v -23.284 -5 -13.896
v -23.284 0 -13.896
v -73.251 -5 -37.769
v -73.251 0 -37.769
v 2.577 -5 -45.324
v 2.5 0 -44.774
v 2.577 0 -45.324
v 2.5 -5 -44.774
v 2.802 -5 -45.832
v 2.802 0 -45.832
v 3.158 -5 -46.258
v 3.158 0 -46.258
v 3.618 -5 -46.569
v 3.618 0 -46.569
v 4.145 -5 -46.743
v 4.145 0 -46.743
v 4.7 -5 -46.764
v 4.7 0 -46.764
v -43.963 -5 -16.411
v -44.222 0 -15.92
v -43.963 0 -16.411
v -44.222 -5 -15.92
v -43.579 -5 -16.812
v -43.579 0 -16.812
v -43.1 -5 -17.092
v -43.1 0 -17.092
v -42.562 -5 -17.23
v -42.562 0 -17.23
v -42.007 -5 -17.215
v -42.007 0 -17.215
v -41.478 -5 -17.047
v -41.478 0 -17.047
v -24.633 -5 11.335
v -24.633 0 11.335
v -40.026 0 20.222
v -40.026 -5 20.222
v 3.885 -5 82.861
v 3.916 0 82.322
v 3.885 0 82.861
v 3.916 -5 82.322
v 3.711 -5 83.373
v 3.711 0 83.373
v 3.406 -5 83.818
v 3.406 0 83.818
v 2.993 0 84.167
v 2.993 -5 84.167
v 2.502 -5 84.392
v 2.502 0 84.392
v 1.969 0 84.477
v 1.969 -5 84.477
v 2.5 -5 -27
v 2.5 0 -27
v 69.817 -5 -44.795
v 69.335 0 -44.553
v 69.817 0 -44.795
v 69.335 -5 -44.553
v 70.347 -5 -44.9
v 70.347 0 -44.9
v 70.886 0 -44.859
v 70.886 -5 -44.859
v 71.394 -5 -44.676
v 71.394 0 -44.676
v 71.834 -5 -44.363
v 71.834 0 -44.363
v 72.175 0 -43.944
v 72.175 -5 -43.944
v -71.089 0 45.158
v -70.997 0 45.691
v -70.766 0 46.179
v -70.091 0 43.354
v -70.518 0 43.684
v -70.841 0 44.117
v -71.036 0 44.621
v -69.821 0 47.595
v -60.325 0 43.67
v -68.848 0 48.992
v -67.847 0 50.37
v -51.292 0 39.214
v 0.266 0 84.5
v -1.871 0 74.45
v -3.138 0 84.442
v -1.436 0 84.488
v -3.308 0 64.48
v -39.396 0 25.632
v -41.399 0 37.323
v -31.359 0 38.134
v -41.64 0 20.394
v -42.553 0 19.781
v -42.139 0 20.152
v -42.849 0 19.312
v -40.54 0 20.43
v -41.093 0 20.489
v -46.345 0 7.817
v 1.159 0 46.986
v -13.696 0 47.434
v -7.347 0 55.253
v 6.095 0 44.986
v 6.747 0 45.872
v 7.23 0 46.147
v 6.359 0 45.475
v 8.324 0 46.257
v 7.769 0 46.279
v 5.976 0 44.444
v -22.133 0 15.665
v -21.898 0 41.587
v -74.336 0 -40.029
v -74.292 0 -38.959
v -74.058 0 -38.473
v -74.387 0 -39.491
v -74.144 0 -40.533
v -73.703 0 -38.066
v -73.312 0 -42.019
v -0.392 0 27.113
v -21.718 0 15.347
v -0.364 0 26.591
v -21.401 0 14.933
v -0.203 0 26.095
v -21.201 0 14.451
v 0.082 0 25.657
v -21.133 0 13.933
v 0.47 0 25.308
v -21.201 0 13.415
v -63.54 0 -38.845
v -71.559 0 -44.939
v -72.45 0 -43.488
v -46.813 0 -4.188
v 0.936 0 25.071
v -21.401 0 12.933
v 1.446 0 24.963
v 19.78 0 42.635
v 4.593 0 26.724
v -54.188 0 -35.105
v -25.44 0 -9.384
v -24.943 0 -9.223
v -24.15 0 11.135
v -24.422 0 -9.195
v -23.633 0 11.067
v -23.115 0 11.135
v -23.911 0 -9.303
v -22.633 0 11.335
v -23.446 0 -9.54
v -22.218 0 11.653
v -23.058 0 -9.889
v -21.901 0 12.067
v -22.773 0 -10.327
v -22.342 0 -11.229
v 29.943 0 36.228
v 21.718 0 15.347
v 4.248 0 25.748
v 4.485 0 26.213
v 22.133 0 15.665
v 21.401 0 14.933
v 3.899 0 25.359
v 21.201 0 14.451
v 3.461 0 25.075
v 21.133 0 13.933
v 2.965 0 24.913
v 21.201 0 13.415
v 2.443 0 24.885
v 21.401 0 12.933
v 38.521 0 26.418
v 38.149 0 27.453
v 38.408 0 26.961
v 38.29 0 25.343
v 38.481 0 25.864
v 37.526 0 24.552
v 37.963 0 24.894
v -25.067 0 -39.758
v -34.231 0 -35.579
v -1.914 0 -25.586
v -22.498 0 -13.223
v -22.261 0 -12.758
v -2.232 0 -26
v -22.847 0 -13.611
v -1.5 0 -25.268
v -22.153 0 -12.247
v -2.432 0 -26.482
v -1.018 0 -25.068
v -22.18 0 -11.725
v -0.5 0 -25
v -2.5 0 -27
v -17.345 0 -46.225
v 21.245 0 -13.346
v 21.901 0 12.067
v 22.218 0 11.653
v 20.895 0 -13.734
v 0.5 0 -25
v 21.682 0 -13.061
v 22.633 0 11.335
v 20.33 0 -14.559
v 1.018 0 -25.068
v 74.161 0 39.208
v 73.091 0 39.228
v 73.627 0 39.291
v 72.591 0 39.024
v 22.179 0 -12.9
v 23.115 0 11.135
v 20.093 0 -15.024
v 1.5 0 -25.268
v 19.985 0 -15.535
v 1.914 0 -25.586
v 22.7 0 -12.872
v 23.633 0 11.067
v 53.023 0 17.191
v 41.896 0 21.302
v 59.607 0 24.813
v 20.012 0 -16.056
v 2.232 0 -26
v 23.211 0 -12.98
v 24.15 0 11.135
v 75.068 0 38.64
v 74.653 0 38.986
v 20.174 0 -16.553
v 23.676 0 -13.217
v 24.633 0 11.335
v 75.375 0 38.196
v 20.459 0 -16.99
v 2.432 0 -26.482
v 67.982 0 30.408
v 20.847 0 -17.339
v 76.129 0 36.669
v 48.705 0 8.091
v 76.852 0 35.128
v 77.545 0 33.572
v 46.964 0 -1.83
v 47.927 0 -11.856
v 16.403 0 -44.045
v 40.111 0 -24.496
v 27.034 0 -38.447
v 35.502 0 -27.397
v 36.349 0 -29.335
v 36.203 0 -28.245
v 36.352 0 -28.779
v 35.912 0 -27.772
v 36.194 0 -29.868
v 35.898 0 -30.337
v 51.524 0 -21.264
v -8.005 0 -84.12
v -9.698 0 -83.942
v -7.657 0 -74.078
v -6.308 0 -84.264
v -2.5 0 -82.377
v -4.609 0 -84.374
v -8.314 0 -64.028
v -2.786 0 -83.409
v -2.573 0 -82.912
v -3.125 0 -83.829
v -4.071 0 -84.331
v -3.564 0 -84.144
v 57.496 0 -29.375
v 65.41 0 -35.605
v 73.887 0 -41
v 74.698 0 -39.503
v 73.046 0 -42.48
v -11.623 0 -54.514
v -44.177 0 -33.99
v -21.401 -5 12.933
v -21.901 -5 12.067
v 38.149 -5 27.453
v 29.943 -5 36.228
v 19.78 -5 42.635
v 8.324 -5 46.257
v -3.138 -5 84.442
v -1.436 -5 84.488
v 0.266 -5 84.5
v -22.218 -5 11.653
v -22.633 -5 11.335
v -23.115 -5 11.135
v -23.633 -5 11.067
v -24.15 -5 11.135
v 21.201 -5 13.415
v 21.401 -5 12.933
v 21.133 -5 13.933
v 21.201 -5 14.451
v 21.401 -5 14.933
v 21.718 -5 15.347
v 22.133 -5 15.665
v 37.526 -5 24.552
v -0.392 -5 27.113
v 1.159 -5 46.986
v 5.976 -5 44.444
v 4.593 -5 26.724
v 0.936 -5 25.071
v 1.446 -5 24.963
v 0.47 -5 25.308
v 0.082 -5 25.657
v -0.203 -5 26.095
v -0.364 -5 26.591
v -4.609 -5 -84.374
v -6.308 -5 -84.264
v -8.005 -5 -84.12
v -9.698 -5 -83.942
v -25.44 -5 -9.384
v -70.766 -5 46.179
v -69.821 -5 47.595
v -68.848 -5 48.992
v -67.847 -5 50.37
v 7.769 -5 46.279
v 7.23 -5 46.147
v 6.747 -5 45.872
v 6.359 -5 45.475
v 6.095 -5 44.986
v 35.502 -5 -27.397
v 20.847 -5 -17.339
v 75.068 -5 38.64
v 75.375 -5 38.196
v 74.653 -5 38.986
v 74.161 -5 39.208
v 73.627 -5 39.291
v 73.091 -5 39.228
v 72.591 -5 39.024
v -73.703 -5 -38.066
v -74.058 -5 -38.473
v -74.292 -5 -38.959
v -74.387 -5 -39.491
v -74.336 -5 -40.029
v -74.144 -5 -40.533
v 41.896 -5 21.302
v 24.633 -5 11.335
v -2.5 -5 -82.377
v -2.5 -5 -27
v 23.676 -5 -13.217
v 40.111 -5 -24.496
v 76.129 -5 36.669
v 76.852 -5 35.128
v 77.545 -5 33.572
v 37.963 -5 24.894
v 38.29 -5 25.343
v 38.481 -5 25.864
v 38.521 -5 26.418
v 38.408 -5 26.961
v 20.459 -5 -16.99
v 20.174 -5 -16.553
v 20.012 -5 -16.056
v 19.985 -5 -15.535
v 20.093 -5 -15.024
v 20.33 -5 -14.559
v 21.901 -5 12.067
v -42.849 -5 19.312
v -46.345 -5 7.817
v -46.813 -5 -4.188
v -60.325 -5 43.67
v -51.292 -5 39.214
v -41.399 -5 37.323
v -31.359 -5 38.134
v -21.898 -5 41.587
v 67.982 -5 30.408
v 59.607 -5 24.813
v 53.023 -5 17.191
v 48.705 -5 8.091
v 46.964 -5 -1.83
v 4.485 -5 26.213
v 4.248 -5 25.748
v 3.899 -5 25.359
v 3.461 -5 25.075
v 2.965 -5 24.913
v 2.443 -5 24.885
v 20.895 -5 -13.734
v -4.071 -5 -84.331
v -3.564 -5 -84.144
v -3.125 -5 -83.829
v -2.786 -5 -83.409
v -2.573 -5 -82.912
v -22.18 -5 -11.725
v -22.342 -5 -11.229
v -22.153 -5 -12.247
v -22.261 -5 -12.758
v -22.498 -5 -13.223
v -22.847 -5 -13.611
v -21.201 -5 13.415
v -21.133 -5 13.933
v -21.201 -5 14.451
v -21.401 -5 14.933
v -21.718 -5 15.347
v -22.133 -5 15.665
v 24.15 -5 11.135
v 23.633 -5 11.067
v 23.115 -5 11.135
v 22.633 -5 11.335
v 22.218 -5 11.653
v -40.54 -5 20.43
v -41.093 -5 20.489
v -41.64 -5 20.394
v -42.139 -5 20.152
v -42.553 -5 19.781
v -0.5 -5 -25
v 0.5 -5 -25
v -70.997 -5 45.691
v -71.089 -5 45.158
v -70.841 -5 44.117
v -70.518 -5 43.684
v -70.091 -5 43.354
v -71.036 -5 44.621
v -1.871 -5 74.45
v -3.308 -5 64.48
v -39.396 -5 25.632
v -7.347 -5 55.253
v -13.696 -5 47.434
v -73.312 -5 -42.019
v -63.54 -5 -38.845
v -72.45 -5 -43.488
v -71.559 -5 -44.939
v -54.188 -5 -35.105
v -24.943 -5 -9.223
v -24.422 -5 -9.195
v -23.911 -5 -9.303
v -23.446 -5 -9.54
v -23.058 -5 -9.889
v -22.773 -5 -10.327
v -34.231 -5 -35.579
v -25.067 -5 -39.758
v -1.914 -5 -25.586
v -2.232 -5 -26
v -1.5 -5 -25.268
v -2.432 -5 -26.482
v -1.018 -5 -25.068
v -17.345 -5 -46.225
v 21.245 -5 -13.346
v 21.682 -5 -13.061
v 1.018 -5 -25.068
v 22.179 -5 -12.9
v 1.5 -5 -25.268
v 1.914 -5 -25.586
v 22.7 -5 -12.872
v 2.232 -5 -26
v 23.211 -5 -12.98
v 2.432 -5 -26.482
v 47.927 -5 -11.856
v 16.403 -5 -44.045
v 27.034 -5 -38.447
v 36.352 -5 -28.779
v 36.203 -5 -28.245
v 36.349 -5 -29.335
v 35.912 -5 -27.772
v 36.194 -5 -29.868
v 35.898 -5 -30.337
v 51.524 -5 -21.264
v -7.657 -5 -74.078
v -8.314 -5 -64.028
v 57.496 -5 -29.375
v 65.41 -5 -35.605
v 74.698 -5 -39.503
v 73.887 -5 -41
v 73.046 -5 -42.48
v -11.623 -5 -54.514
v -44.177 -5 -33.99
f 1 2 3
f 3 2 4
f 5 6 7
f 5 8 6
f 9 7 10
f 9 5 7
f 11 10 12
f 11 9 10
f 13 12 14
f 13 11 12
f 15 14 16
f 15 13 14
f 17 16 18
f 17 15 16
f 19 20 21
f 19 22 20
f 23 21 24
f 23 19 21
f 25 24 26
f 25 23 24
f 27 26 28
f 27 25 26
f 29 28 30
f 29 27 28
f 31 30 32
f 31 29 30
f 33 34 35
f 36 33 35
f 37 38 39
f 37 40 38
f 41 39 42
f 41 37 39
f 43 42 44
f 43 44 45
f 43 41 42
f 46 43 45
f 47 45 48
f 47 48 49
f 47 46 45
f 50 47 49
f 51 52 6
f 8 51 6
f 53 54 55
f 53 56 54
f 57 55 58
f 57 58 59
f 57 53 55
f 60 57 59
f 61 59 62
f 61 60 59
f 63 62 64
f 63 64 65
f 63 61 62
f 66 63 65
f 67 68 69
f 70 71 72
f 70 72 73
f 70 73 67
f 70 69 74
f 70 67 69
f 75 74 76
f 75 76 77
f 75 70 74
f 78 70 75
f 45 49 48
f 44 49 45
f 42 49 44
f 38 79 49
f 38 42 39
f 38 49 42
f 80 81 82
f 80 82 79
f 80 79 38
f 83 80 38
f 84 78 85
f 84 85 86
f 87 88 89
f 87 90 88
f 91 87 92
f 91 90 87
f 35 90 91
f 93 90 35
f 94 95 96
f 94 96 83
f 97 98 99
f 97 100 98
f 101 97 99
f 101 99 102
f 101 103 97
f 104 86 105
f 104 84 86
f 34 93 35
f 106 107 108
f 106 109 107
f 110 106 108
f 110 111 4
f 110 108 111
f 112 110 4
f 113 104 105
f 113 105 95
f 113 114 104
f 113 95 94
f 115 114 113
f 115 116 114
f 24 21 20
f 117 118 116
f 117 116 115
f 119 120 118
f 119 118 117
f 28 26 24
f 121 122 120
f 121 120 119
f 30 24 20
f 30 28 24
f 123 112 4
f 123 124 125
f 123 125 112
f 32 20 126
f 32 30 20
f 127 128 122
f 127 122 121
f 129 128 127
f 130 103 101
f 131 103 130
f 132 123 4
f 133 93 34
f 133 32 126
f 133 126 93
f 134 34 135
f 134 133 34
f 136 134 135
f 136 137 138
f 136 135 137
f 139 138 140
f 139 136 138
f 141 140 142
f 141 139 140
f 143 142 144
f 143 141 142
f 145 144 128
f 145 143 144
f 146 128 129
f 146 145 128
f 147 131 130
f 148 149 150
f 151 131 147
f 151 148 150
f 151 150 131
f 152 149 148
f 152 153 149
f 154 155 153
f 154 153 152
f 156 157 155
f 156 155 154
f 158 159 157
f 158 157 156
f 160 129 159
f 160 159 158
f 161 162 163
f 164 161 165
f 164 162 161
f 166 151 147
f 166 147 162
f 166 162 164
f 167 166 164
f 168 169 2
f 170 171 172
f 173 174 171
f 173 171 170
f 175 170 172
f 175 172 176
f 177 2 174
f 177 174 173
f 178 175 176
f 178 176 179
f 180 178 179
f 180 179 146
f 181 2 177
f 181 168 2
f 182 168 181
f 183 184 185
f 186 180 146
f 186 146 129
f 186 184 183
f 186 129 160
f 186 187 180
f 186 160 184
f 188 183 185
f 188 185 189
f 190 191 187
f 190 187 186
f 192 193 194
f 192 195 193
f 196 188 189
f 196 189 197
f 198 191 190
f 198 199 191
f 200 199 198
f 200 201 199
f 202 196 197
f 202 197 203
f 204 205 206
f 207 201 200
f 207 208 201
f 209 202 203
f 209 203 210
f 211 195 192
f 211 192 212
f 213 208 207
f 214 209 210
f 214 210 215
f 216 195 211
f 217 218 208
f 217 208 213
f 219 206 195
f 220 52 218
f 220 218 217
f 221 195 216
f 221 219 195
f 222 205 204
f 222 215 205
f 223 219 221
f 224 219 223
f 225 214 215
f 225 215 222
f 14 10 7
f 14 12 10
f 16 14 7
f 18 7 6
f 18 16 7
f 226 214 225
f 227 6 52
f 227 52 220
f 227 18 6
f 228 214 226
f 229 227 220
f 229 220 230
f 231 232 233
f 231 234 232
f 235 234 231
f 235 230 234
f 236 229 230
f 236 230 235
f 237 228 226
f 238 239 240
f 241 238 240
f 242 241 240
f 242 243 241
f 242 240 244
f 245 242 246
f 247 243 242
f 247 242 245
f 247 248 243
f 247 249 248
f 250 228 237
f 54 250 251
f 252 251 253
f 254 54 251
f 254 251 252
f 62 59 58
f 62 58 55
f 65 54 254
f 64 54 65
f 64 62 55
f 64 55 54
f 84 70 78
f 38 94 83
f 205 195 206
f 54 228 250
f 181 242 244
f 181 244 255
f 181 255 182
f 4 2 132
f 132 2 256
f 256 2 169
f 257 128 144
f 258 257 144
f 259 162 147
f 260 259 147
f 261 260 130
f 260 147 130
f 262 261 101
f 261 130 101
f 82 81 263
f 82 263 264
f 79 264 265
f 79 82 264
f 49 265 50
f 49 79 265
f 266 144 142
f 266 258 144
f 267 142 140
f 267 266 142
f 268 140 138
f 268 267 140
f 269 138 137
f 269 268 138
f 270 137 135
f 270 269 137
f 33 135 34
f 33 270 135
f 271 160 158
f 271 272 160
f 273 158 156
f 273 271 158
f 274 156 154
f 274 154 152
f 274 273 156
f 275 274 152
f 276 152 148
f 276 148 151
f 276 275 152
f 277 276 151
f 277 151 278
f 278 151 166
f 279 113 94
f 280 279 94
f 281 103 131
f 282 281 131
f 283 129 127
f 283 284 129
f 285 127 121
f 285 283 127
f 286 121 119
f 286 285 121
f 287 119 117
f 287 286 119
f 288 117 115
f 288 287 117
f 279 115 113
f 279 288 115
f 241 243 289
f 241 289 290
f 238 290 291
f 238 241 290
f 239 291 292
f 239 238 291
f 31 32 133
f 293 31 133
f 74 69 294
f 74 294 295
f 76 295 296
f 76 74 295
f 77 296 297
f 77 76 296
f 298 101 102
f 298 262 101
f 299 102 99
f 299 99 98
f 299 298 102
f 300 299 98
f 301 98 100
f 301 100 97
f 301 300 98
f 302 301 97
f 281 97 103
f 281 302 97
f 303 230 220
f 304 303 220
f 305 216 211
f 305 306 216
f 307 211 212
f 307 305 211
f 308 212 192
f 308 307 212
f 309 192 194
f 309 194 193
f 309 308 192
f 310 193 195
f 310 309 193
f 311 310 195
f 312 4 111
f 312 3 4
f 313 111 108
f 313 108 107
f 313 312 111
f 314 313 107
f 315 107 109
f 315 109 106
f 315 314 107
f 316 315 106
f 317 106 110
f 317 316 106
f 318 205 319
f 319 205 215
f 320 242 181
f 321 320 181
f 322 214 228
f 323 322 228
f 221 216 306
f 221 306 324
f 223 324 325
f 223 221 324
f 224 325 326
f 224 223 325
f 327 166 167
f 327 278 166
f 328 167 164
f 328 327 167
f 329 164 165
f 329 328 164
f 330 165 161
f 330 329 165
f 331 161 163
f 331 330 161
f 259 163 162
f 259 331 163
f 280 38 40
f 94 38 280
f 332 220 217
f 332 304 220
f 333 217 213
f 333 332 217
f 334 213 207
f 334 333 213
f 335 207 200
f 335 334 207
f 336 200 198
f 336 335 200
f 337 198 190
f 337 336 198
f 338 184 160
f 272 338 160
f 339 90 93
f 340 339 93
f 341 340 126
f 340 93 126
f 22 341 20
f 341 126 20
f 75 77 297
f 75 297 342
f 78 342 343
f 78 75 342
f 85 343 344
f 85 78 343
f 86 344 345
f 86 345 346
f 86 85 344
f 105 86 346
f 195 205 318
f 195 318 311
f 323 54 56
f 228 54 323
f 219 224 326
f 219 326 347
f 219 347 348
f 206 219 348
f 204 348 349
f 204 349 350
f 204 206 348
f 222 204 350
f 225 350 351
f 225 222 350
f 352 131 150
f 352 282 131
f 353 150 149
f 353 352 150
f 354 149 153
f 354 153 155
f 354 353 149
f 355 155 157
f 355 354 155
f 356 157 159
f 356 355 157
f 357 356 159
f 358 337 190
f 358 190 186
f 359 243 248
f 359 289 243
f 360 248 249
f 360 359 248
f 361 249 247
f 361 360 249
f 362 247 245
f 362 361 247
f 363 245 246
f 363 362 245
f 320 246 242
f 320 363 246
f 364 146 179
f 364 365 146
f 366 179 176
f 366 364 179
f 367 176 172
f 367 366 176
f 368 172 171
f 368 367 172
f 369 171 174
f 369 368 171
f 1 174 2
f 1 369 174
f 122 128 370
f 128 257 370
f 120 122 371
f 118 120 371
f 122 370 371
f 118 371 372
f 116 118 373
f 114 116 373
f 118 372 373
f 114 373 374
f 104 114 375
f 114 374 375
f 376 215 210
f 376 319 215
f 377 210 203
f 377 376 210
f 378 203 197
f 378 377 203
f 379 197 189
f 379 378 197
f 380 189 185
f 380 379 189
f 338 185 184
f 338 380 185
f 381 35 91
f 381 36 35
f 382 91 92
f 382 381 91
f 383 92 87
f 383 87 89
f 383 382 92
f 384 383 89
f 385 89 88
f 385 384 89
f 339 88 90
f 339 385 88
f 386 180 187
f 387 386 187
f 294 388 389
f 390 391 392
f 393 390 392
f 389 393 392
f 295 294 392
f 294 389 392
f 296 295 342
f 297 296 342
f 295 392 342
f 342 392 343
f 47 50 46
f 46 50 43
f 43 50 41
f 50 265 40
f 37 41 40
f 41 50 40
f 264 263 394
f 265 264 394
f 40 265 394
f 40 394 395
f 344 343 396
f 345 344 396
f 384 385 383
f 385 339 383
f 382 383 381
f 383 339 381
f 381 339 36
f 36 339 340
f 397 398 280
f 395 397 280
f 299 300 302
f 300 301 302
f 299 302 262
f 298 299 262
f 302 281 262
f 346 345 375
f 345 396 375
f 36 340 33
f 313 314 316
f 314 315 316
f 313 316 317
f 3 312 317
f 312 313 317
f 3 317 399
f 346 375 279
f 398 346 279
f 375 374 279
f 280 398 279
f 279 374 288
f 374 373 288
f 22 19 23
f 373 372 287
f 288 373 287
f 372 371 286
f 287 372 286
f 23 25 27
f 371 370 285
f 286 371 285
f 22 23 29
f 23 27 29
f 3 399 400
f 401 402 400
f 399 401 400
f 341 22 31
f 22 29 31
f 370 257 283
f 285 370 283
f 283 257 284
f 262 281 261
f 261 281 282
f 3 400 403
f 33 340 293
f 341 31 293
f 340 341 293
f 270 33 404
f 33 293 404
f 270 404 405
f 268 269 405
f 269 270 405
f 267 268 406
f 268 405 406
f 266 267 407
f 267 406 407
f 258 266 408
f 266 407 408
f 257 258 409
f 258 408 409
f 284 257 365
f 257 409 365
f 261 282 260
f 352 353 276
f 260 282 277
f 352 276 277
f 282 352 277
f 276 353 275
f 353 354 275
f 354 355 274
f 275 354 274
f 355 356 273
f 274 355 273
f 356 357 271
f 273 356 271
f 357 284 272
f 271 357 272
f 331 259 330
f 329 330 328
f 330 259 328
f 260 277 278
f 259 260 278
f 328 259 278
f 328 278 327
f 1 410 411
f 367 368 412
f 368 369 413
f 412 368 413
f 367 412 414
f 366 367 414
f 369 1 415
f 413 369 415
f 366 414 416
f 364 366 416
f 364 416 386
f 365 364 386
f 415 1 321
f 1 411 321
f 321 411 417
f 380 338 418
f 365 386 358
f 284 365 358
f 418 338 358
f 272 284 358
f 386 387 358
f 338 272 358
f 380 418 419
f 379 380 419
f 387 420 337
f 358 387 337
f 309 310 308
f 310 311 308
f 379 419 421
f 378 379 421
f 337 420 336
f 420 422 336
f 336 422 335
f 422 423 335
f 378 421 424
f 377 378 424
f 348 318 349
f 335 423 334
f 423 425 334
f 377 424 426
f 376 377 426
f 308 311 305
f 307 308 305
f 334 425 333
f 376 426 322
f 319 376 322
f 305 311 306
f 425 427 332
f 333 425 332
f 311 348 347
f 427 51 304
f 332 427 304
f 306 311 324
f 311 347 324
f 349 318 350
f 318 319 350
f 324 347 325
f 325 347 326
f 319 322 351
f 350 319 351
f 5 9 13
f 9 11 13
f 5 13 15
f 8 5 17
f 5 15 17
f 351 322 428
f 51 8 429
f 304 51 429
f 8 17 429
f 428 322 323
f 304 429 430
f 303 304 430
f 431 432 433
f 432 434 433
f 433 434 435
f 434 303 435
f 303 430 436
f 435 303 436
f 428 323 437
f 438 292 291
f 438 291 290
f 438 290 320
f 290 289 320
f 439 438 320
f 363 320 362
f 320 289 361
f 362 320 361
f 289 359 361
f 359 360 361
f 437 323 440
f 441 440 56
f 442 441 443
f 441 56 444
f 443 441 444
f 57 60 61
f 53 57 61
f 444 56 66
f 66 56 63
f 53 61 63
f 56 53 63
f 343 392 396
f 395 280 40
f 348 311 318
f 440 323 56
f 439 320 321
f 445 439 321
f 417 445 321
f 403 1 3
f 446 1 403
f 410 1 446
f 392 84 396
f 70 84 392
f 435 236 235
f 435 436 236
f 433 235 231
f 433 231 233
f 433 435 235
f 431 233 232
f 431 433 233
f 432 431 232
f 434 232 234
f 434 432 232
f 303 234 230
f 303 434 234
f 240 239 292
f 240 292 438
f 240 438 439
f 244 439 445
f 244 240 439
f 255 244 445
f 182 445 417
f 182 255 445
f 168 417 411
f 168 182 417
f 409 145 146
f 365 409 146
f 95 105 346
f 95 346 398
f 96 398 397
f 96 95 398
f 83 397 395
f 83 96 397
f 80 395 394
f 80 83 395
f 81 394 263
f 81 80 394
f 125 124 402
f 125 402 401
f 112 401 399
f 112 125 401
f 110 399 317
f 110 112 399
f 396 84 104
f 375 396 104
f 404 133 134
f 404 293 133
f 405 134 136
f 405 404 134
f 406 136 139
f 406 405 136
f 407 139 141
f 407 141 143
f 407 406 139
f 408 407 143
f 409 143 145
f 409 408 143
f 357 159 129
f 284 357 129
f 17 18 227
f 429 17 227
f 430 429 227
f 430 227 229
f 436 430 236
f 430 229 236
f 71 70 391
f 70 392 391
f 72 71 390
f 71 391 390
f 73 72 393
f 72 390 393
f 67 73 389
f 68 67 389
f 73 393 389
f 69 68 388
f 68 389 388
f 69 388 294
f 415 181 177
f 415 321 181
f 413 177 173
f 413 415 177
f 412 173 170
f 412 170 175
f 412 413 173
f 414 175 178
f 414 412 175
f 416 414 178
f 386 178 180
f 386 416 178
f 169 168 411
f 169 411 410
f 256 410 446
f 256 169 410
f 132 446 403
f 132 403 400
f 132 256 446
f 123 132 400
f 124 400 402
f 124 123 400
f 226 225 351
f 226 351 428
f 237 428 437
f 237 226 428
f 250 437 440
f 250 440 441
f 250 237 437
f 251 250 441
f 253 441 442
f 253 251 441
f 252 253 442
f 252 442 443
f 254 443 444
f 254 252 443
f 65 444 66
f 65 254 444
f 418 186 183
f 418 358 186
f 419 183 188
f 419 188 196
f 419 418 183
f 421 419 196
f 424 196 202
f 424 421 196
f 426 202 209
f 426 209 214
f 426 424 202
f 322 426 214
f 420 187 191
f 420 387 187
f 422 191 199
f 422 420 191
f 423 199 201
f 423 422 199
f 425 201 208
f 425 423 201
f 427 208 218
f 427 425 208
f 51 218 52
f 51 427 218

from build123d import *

# Parameters (mm, degrees)
EXTRUDE_1_DEPTH = 5
EXTRUDE_2_DEPTH = 5
FILLET_1_R      = 2


with BuildPart() as part:
    # 草圖1 → 填料-伸長1 (new body)
    with BuildSketch(Plane(origin=(0, 0, 0), x_dir=(1, 0, 0), z_dir=(0, 1, 0))):
        with BuildLine():
            Line((41.895571715, -21.301668261), (22.900635095, -10.334936491))
            Line((22.900635095, -10.334936491), (20.400635095, -14.665063509))
            Line((20.400635095, -14.665063509), (39.395571715, -25.63179528))
            ThreePointArc((39.395571715, -25.63179528), (25.066666667, -39.75754296), (6.143670641, -46.596730691))
            Line((6.143670641, -46.596730691), (4.437329437, -24.729741355))
            Line((4.437329437, -24.729741355), (-0.547516958, -25.118722602))
            Line((-0.547516958, -25.118722602), (1.158824246, -46.985711938))
            ThreePointArc((1.158824246, -46.985711938), (-21.897708862, -41.587141602), (-39.395571715, -25.63179528))
            Line((-39.395571715, -25.63179528), (-20.400635095, -14.665063509))
            Line((-20.400635095, -14.665063509), (-22.900635095, -10.334936491))
            Line((-22.900635095, -10.334936491), (-41.895571715, -21.301668261))
            ThreePointArc((-41.895571715, -21.301668261), (-46.964375529, -1.829598641), (-43.425787832, 17.977790497))
            Line((-43.425787832, 17.977790497), (-23.635248961, 8.522030659))
            Line((-23.635248961, 8.522030659), (-21.479693405, 13.033524896))
            Line((-21.479693405, 13.033524896), (-41.270232276, 22.489284734))
            ThreePointArc((-41.270232276, 22.489284734), (-25.066666667, 39.75754296), (-2.5, 46.933463541))
            Line((-2.5, 46.933463541), (-2.5, 25))
            Line((-2.5, 25), (2.5, 25))
            Line((2.5, 25), (2.5, 46.933463541))
            ThreePointArc((2.5, 46.933463541), (21.897708862, 41.587141602), (37.282117191, 28.618940193))
            Line((37.282117191, 28.618940193), (19.197919523, 16.207710695))
            Line((19.197919523, 16.207710695), (22.027210363, 12.085197706))
            Line((22.027210363, 12.085197706), (40.111408031, 24.496427205))
            ThreePointArc((40.111408031, 24.496427205), (46.964375529, 1.829598641), (41.895571715, -21.301668261))
        make_face()
    extrude(amount=-EXTRUDE_1_DEPTH)

    # 草圖2 → 填料-伸長2 (add)
    with BuildSketch(Plane(origin=(0, 0, 0), x_dir=(1, 0, 0), z_dir=(0, 1, 0))):
        with BuildLine():
            ThreePointArc((-21.897708534, -41.587141774), (-31.667962065, -34.729528915), (-39.395571715, -25.63179528))
            Line((-39.395571715, -25.63179528), (-71.897112041, -44.396568337))
            ThreePointArc((-71.897112041, -44.396568337), (-69.935607979, -47.426371742), (-67.846508155, -50.369646923))
            ThreePointArc((-67.846508155, -50.369646923), (-46.409467113, -37.935155113), (-21.897708534, -41.587141774))
        make_face()
        with BuildLine():
            ThreePointArc((1.158824246, -46.985711938), (-10.715011448, -45.76230468), (-21.897708534, -41.587141774))
            ThreePointArc((-21.897708534, -41.587141774), (-5.016457748, -59.73064391), (-3.138403923, -84.441698353))
            ThreePointArc((-3.138403923, -84.441698353), (0.470468308, -84.498690283), (4.078482182, -84.401516474))
            Line((4.078482182, -84.401516474), (1.158824246, -46.985711938))
        make_face()
        with BuildLine():
            ThreePointArc((46.964375577, 1.829597397), (45.910635161, -10.060495966), (41.895571715, -21.301668261))
            Line((41.895571715, -21.301668261), (74.397112041, -40.066441318))
            ThreePointArc((74.397112041, -40.066441318), (76.040246727, -36.852827268), (77.544647892, -33.571976159))
            ThreePointArc((77.544647892, -33.571976159), (56.057542109, -21.224200551), (46.964375577, 1.829597397))
        make_face()
        with BuildLine():
            ThreePointArc((40.111408031, 24.496427205), (44.988824347, 13.601679451), (46.964375577, 1.829597397))
            ThreePointArc((46.964375577, 1.829597397), (54.236483405, 25.520941458), (74.697857874, 39.502911652))
            ThreePointArc((74.697857874, 39.502911652), (72.942778218, 42.656782648), (71.054616293, 45.732827415))
            Line((71.054616293, 45.732827415), (40.111408031, 24.496427205))
        make_face()
        with BuildLine():
            ThreePointArc((-25.066667605, 39.757542368), (-14.242673622, 44.79002398), (-2.5, 46.933463541))
            Line((-2.5, 46.933463541), (-2.5, 84.463009655))
            ThreePointArc((-2.5, 84.463009655), (-6.104638749, 84.27919901), (-9.698139737, 83.941623082))
            ThreePointArc((-9.698139737, 83.941623082), (-9.648074589, 59.159354704), (-25.066667605, 39.757542368))
        make_face()
        with BuildLine():
            ThreePointArc((-41.270232276, 22.489284734), (-34.273812918, 32.160624187), (-25.066667605, 39.757542368))
            ThreePointArc((-25.066667605, 39.757542368), (-49.220026504, 34.209701843), (-71.559453951, 44.938786701))
            ThreePointArc((-71.559453951, 44.938786701), (-73.413246526, 41.841907635), (-75.133098475, 38.668689059))
            Line((-75.133098475, 38.668689059), (-41.270232276, 22.489284734))
        make_face()
    extrude(amount=-EXTRUDE_2_DEPTH)

    # 圓角1
    fillet_1_edges = [part.edges().sort_by_distance(p)[0] for p in [
        (71.054616293, -2.5, -45.732827415),
        (-2.5, -2.5, -84.463009655),
        (-75.133098475, -2.5, -38.668689059),
        (4.437329437, -2.5, 24.729741355),
        (-0.547516958, -2.5, 25.118722602),
        (-20.400635095, -2.5, 14.665063509),
        (-22.900635095, -2.5, 10.334936491),
        (-41.895571715, -2.5, 21.301668261),
        (-43.425787832, -2.5, -17.977790497),
        (-23.635248961, -2.5, -8.522030659),
        (-21.479693405, -2.5, -13.033524896),
        (-2.5, -2.5, -25),
        (2.5, -2.5, -25),
        (2.5, -2.5, -46.933463541),
        (37.282117191, -2.5, -28.618940193),
        (19.197919523, -2.5, -16.207710695),
        (22.027210363, -2.5, -12.085197706),
        (22.900635095, -2.5, 10.334936491),
        (20.400635095, -2.5, 14.665063509),
        (39.395571715, -2.5, 25.63179528),
        (6.143670641, -2.5, 46.596730691),
        (-71.897112041, -2.5, 44.396568337),
        (4.078482182, -2.5, 84.401516474),
        (74.397112041, -2.5, 40.066441318),
    ]]
    fillet(fillet_1_edges, radius=FILLET_1_R)


solid = part.part
